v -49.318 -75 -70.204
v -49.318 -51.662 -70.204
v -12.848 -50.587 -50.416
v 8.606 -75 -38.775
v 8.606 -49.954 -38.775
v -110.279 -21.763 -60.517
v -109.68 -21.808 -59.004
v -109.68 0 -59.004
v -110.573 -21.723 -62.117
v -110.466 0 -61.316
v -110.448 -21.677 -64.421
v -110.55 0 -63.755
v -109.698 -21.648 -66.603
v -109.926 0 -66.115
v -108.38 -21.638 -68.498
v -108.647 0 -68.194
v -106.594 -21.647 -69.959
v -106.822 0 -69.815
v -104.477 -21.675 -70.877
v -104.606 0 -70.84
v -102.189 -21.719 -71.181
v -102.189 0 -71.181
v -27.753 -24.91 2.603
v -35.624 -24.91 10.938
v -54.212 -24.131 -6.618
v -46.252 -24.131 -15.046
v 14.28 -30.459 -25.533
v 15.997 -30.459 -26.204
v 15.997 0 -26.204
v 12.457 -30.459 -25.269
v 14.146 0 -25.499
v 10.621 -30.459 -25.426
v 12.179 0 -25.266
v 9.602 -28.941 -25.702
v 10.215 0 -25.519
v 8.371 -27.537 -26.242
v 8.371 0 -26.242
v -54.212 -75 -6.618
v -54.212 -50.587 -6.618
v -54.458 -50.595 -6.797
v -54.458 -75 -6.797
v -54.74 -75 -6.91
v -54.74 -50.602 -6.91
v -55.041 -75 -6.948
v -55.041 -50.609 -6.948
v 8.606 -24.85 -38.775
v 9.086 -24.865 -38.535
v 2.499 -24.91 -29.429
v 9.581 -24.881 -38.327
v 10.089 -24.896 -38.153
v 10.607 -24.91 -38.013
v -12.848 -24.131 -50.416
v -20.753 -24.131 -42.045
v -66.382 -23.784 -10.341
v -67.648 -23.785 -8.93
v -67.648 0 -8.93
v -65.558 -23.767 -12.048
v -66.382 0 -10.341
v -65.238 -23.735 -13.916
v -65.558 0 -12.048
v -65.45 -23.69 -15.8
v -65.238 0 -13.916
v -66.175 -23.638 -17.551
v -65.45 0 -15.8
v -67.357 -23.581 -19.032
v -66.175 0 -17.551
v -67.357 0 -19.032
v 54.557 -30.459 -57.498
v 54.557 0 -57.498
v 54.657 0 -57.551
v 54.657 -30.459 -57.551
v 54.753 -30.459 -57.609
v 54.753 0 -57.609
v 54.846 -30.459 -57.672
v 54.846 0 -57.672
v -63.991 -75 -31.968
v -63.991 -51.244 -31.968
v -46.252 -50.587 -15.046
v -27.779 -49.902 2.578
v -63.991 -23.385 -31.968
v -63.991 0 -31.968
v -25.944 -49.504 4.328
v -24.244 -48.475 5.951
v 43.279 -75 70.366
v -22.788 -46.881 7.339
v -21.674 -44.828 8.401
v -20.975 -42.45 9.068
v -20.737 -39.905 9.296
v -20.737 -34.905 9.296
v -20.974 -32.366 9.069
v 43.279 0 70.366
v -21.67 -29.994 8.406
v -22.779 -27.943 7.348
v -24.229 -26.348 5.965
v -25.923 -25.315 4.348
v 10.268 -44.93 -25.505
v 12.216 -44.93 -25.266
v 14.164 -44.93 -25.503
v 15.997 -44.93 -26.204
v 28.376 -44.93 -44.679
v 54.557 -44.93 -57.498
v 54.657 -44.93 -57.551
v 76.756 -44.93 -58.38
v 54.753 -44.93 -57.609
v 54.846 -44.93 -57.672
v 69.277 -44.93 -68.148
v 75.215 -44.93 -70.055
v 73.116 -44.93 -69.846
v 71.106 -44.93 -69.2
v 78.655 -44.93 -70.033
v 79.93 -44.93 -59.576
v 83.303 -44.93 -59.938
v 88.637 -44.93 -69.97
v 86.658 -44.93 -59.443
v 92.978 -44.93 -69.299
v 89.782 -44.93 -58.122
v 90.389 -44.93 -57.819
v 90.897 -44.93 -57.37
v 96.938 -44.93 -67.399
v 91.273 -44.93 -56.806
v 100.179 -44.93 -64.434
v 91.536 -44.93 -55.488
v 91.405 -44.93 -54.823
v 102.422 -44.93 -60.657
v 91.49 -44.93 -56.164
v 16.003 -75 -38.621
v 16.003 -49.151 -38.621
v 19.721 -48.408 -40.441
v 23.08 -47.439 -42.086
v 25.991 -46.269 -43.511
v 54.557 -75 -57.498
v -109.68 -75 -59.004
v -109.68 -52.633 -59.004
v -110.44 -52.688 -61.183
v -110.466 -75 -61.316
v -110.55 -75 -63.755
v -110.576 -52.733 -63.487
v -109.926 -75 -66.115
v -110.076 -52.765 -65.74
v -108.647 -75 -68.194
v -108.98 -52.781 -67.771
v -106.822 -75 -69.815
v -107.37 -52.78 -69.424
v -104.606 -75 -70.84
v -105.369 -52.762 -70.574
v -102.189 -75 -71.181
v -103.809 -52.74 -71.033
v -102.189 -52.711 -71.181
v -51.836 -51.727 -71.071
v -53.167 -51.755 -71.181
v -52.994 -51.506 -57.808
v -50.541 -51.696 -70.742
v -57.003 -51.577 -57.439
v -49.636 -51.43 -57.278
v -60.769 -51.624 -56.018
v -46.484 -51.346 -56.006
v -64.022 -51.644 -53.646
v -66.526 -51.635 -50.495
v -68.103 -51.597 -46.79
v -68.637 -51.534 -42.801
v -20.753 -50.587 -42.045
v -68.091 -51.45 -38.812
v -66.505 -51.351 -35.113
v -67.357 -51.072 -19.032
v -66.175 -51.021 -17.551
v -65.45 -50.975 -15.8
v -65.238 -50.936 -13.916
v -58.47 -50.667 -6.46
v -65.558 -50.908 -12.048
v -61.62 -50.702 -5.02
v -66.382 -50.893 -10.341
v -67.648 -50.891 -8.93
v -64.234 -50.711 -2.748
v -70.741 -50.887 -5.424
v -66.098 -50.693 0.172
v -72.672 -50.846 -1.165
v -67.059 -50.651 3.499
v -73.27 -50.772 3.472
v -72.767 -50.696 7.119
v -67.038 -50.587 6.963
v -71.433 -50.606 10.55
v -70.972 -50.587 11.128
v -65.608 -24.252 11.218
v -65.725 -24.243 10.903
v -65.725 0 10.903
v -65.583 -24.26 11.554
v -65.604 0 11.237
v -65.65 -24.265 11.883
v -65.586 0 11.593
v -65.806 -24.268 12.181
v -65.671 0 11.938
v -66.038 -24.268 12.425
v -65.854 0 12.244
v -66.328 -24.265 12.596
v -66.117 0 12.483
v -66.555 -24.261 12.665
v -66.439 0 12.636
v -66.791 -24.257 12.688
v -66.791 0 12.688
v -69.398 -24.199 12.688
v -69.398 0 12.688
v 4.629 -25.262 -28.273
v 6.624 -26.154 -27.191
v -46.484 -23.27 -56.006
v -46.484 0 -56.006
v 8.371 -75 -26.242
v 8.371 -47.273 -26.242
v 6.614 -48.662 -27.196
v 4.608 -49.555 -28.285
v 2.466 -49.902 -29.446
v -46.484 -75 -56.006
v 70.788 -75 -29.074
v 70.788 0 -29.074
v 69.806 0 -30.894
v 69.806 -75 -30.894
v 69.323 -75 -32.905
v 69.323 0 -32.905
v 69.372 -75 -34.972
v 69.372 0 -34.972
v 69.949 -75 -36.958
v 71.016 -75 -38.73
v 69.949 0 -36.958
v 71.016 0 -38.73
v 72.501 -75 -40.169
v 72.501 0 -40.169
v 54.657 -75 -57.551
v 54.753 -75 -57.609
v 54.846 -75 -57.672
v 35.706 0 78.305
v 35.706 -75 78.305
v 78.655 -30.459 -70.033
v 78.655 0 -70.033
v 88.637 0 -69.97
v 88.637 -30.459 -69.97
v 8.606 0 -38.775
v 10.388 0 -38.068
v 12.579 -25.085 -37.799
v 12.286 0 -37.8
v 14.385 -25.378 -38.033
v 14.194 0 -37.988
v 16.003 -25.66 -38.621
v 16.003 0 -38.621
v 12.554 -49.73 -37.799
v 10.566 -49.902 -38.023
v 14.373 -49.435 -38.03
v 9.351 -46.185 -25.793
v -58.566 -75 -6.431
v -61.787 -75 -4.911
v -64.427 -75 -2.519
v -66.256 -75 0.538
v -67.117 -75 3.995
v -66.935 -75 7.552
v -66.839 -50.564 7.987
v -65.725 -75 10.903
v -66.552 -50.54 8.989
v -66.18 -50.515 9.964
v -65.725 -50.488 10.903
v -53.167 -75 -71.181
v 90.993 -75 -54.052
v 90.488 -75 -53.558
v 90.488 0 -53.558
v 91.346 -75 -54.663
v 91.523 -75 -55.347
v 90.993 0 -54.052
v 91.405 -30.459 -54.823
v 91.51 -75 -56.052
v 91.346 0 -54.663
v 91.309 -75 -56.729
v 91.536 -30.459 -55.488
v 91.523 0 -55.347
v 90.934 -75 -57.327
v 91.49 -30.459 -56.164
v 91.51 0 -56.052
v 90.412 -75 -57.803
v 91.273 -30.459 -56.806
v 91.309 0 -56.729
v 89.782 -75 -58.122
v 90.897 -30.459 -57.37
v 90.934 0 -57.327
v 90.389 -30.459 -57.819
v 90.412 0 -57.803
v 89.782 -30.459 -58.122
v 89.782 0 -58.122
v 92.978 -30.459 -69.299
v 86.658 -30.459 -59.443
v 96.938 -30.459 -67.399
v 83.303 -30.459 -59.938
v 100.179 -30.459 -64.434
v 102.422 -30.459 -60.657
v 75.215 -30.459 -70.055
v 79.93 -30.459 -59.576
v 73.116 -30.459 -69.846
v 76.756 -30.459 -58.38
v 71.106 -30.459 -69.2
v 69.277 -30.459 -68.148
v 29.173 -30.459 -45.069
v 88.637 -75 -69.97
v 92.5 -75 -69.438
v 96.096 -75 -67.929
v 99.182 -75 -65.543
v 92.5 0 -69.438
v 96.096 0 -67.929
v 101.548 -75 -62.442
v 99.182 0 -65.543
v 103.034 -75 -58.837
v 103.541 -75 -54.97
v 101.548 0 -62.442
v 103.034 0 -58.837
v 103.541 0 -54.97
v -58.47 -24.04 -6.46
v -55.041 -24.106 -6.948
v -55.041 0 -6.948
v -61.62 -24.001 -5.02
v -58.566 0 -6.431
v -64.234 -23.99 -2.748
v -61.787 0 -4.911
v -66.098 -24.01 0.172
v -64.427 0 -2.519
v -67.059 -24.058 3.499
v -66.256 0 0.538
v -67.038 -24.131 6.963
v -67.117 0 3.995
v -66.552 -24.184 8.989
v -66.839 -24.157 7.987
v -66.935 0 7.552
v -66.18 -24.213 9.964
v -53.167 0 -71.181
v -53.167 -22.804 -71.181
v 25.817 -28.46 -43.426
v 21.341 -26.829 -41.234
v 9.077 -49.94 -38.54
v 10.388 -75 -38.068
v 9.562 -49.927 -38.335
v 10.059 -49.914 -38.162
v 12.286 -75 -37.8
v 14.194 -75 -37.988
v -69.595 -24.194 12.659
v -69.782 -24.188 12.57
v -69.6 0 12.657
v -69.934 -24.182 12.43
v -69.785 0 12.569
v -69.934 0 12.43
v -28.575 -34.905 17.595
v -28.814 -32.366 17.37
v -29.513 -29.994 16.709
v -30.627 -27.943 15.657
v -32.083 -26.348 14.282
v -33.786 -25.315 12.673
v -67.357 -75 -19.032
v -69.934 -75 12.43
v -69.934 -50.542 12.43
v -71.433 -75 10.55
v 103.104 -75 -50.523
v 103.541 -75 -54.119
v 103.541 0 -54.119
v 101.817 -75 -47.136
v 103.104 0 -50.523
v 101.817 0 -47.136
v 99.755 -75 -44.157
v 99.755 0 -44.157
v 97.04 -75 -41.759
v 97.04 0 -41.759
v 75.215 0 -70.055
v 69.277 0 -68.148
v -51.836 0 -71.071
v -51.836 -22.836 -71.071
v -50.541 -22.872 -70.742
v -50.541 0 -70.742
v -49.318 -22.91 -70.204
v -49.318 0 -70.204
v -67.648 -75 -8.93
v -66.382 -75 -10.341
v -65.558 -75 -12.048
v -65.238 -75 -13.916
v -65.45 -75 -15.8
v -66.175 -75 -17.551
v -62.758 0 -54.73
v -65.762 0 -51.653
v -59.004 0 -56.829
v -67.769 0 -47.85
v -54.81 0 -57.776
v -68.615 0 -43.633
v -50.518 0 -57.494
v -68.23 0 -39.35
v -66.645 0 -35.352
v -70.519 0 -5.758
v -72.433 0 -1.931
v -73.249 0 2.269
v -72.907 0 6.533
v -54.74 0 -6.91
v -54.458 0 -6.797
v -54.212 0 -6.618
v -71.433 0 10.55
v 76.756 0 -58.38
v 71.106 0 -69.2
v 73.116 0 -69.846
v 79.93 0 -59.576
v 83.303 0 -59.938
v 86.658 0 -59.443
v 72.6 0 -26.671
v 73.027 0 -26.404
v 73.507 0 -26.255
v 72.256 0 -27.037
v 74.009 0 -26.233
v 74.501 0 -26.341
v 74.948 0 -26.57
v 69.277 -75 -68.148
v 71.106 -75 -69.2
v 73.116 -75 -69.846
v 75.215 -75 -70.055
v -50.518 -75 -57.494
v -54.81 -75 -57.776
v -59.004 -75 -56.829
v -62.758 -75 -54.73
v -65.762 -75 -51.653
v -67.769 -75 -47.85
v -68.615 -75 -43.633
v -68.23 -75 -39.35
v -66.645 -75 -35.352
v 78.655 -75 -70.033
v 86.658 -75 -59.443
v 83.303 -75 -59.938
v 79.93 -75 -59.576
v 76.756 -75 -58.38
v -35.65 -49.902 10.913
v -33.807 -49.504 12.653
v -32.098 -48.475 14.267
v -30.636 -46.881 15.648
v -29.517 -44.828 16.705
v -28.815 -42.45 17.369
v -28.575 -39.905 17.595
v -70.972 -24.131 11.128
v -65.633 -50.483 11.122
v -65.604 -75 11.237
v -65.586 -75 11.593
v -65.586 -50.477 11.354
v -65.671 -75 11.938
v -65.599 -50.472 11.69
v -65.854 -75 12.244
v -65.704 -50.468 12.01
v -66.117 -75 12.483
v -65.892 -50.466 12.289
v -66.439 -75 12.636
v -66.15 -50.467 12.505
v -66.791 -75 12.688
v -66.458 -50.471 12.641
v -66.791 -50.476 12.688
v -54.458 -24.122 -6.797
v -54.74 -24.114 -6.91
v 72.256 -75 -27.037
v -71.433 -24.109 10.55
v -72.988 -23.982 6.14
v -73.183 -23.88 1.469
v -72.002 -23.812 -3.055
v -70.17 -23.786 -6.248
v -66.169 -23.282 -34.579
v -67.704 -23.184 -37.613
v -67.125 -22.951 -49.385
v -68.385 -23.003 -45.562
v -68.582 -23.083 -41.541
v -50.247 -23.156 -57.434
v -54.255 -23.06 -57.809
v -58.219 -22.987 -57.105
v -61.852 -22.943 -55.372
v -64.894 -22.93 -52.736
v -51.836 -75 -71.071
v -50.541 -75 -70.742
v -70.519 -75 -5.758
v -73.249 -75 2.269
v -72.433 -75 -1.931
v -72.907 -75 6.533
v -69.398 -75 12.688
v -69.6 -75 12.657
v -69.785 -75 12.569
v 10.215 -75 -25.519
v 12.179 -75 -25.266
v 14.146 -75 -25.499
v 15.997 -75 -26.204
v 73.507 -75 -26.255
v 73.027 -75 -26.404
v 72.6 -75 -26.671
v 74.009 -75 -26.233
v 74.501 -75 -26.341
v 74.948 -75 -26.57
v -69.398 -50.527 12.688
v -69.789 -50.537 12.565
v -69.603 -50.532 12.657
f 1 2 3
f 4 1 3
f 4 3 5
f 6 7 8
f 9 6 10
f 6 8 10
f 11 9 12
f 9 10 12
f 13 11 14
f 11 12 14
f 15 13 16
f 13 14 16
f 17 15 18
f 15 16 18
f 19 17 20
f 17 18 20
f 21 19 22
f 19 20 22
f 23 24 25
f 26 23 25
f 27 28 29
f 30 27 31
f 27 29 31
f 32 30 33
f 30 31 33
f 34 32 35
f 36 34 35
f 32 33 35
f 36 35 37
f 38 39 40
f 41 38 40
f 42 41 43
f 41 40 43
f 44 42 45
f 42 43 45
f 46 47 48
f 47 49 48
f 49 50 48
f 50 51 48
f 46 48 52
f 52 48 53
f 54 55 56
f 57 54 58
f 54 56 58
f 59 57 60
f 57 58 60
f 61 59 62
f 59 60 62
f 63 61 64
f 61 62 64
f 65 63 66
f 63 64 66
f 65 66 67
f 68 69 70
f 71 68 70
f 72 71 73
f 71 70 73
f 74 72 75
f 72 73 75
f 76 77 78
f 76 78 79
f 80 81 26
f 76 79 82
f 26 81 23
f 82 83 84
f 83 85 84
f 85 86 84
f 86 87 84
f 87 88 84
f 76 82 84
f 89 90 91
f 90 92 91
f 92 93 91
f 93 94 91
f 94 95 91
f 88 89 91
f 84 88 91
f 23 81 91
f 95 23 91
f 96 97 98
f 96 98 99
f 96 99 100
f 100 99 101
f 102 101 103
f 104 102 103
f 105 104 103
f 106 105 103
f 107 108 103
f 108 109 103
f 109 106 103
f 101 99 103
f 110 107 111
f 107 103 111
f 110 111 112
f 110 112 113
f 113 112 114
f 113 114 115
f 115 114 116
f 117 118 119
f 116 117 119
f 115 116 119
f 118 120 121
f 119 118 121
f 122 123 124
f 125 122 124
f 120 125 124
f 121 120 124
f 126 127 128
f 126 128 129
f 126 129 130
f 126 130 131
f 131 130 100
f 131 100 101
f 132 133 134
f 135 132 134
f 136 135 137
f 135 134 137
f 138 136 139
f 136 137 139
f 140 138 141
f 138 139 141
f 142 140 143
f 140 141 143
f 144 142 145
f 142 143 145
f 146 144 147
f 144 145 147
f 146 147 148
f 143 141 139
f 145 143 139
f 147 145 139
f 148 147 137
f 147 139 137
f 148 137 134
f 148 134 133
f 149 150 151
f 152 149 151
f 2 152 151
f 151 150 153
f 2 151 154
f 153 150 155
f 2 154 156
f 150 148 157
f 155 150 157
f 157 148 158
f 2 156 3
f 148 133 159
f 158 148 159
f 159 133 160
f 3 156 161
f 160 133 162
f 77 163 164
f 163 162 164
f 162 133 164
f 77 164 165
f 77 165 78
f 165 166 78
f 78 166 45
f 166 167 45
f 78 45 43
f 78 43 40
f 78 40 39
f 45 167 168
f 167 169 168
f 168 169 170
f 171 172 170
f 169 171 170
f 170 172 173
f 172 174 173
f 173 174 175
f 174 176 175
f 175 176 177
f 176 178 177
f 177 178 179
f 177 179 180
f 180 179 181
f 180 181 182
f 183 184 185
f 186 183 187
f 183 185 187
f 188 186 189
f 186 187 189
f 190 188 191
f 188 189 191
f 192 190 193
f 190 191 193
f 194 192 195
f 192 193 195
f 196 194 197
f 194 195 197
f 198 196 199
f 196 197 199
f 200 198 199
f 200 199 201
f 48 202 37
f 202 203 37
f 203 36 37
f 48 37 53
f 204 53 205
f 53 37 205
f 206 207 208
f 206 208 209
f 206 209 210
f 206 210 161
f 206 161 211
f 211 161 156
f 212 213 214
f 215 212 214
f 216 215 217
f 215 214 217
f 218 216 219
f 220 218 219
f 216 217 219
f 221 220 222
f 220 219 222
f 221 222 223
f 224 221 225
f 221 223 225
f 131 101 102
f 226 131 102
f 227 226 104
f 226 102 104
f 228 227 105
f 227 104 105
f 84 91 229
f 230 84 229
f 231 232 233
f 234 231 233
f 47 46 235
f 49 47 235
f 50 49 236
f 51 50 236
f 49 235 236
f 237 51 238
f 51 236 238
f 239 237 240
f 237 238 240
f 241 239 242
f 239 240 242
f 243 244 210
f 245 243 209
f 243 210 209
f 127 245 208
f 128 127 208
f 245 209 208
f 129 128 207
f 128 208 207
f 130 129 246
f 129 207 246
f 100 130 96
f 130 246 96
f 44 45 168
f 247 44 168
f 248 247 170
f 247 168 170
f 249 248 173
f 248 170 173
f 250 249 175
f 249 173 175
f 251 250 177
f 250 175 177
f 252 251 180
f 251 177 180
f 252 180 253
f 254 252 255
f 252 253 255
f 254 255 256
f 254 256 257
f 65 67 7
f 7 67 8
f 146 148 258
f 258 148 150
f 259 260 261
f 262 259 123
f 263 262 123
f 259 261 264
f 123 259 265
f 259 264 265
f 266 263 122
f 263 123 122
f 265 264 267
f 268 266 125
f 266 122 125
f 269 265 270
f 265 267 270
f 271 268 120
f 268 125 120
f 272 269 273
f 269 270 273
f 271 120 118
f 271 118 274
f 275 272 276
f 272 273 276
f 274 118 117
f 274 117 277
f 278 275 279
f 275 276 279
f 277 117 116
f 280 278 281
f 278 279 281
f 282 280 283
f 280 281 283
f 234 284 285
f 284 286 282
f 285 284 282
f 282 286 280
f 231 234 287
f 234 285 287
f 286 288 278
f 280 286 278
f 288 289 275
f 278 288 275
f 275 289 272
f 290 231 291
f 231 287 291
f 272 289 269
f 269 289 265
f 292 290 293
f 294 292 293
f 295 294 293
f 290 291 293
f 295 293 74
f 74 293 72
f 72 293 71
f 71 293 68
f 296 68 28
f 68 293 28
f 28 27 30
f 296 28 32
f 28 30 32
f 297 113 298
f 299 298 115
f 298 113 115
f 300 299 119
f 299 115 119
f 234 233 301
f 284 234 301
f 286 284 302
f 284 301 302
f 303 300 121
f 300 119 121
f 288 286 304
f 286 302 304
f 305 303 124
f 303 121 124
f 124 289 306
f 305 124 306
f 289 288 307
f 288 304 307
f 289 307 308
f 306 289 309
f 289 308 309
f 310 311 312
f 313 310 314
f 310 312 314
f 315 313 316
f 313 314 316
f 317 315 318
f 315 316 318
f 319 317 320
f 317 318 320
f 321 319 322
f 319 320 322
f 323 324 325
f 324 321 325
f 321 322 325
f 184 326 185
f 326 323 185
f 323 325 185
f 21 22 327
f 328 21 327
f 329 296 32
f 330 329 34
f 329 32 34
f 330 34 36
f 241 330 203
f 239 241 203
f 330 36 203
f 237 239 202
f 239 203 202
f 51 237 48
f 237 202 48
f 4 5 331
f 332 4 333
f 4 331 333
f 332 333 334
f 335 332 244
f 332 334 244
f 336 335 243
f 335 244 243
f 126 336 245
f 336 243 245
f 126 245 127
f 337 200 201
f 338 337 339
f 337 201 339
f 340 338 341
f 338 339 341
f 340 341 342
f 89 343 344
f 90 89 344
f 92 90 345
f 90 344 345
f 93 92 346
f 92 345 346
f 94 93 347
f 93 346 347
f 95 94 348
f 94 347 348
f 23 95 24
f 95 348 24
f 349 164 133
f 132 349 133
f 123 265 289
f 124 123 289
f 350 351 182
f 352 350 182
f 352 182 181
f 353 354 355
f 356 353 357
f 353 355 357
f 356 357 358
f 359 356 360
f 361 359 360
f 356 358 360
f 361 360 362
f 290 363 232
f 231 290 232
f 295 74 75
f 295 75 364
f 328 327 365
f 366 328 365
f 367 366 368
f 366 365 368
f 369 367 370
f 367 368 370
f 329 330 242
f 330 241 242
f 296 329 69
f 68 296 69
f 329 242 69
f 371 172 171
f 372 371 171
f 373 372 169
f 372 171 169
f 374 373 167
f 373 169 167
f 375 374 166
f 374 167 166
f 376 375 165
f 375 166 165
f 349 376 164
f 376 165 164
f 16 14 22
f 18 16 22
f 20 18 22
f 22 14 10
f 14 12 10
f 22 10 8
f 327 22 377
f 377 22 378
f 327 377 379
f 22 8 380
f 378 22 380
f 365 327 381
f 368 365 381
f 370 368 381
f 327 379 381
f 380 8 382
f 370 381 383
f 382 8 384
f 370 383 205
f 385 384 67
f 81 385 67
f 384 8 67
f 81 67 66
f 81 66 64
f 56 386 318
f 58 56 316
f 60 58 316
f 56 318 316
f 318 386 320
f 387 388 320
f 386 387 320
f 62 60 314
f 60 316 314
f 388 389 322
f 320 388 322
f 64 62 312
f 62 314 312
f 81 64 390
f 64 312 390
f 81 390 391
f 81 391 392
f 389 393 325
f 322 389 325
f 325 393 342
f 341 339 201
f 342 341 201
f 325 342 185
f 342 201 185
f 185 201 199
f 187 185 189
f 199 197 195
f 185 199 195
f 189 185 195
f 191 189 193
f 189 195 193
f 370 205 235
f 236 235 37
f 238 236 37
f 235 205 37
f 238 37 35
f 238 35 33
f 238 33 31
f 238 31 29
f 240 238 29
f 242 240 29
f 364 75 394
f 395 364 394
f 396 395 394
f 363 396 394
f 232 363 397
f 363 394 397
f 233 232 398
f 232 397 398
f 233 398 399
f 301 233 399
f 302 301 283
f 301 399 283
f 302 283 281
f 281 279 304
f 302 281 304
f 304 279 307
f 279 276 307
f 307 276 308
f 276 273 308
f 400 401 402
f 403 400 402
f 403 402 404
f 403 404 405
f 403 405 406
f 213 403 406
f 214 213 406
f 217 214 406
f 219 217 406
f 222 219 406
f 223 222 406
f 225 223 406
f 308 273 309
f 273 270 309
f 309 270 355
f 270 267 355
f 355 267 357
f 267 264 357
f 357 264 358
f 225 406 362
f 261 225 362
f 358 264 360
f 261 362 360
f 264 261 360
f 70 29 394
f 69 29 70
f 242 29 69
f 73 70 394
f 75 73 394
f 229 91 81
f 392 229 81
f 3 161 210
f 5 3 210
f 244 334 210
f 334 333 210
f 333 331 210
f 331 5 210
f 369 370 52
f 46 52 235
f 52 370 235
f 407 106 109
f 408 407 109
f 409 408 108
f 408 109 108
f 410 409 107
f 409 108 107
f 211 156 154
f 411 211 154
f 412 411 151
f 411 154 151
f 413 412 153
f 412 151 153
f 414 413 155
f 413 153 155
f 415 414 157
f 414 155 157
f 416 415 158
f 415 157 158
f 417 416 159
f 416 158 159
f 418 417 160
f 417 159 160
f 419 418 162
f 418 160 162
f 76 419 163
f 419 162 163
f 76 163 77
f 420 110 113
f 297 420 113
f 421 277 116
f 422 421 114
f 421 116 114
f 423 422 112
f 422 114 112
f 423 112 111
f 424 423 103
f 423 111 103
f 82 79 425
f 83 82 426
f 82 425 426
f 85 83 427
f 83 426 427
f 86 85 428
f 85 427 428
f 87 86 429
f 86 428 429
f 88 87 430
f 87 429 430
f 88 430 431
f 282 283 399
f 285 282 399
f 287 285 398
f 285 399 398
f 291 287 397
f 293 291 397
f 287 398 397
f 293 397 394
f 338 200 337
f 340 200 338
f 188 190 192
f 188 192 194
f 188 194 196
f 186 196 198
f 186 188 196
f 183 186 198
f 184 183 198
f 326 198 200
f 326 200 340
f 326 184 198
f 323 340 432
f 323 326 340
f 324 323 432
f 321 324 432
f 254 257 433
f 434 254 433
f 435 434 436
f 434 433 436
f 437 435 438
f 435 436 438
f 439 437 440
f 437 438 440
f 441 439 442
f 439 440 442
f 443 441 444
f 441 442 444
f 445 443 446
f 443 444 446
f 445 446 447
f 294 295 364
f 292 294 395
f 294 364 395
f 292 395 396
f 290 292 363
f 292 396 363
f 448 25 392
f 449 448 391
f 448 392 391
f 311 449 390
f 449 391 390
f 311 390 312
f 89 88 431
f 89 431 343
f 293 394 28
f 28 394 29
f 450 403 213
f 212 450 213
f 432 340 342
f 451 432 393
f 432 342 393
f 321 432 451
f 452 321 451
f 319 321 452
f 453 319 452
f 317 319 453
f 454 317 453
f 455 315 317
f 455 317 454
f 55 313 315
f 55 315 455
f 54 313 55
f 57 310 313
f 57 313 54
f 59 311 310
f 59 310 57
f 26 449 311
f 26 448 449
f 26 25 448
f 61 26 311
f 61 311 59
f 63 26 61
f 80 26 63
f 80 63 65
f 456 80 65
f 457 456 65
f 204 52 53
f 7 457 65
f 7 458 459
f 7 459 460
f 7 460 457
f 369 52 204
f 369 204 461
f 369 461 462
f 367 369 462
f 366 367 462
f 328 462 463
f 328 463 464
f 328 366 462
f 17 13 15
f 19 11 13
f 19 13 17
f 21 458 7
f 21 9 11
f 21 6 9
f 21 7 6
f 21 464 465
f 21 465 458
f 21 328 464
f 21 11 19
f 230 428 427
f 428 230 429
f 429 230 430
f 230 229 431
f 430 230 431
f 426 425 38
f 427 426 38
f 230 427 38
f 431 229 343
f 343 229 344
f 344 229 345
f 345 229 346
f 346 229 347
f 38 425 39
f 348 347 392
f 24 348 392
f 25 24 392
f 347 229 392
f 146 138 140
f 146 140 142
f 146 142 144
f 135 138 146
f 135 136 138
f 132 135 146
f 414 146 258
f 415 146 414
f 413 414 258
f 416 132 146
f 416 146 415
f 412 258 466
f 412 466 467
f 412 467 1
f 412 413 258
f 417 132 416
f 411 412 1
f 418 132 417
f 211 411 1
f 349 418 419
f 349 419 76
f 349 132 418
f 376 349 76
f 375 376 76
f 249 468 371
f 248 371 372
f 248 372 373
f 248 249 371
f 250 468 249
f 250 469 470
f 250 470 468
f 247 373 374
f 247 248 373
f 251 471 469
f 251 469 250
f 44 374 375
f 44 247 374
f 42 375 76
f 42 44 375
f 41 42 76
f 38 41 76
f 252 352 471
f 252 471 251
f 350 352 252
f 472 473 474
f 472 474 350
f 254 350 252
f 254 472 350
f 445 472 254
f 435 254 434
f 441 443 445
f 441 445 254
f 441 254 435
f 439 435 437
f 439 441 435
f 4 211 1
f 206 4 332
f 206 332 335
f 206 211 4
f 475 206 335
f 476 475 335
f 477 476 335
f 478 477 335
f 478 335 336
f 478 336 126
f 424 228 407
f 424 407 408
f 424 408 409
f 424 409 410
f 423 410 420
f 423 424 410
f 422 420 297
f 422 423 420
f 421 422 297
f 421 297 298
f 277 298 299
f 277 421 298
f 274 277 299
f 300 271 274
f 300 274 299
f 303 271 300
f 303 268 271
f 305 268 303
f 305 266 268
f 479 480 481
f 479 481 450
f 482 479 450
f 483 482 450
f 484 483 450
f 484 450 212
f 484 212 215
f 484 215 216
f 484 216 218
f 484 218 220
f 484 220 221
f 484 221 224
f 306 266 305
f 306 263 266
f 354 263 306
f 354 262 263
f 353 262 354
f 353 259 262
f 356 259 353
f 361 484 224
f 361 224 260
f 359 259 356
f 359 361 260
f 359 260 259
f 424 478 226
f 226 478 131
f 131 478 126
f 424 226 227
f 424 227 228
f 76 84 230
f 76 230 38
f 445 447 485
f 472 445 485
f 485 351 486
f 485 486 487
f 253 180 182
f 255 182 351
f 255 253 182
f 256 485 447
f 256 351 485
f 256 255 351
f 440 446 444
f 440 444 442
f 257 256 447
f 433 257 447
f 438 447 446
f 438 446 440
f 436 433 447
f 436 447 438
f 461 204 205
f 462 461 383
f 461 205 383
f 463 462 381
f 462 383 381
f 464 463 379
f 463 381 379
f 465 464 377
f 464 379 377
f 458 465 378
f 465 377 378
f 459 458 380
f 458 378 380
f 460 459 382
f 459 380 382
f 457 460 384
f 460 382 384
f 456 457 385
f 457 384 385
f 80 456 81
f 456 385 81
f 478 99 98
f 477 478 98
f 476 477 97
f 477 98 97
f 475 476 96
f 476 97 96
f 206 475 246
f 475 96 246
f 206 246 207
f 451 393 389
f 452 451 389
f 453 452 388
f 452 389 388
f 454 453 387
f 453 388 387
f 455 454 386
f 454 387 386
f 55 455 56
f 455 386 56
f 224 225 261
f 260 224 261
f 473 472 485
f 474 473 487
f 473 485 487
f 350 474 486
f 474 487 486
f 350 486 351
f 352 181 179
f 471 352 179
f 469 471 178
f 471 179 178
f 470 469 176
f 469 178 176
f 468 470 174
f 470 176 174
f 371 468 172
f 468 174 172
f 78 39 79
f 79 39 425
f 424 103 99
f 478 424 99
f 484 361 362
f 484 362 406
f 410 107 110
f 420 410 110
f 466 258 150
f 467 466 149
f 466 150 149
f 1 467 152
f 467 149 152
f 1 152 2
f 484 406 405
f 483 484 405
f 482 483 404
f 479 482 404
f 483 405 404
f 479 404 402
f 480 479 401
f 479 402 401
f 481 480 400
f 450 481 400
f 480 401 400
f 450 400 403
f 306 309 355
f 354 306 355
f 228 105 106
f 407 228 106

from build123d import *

# Parameters (mm, degrees)
F1_DEPTH      = 75
F3_DEPTH      = 30
F3_DEPTH_BACK = 90
F4_W          = 68.7531680209
F4_H          = 14.4708263688
F5_DEPTH      = 25
F5_DEPTH_BACK = 10


with BuildPart() as f1:
    # F0 (on Front) → F1 (new body)
    with BuildSketch(Plane.XZ):
        with BuildLine():
            Line((35.7055822906, 78.3045381219), (-54.2122411279, -6.6178094916))
            ThreePointArc((-54.2122411279, -6.6178094916), (-54.5952252844, -6.8622663067), (-55.0413462098, -6.9483599686))
            ThreePointArc((-55.0413462098, -6.9483599686), (-65.454548531, -1.0579541733), (-65.7249668893, 10.9027538713))
            ThreePointArc((-65.7249668893, 10.9027538713), (-65.7514161094, 12.0978334092), (-66.7910191515, 12.6878674574))
            Line((-66.7910191515, 12.6878674574), (-69.3984164298, 12.6878674574))
            ThreePointArc((-69.3984164298, 12.6878674574), (-69.6958292502, 12.6199768131), (-69.9343224371, 12.4297545087))
            Line((-69.9343224371, 12.4297545087), (-71.4332162747, 10.549801355))
            ThreePointArc((-71.4332162747, 10.549801355), (-72.983516127, 0.1409632474), (-67.6478594542, -8.9297648519))
            ThreePointArc((-67.6478594542, -8.9297648519), (-65.2384193211, -13.915925777), (-67.3571118078, -19.0324035373))
            Line((-67.3571118078, -19.0324035373), (-109.6802590447, -59.0042454993))
            ThreePointArc((-109.6802590447, -59.0042454993), (-109.3628044531, -67.2017482376), (-102.1890001615, -71.1812407363))
            Line((-102.1890001615, -71.1812407363), (-53.1669473059, -71.1812407356))
            ThreePointArc((-53.1669473059, -71.1812407356), (-51.1816807122, -70.9332267187), (-49.3184445074, -70.2044295966))
            Line((-49.3184445074, -70.2044295966), (8.606172505, -38.7753114248))
            ThreePointArc((8.606172505, -38.7753114248), (12.2860183049, -37.8002629481), (16.0033975224, -38.6206752819))
            Line((16.0033975224, -38.6206752819), (54.5573614144, -57.4984885011))
            ThreePointArc((54.5573614144, -57.4984885011), (54.7053822121, -57.5790589788), (54.8459093451, -57.6720852296))
            Line((54.8459093451, -57.6720852296), (69.2774157369, -68.1477812421))
            ThreePointArc((69.2774157369, -68.1477812421), (72.0938830707, -69.5760831015), (75.2153037267, -70.0549019945))
            Line((75.2153037267, -70.0549019945), (78.6547126816, -70.03306521))
            Line((78.6547126816, -70.03306521), (88.6365619759, -69.9696905154))
            ThreePointArc((88.6365619759, -69.9696905154), (99.1815473838, -65.542870992), (103.5413289953, -54.9699928292))
            Line((103.5413289953, -54.9699928292), (103.5413289953, -54.1190856195))
            ThreePointArc((103.5413289953, -54.1190856195), (101.8167785406, -47.1360748524), (97.0396704124, -41.7587380046))
            Line((97.0396704124, -41.7587380046), (74.9481714859, -26.5697557736))
            ThreePointArc((74.9481714859, -26.5697557736), (73.5068370972, -26.2547430485), (72.2561461348, -27.0373348667))
            Line((72.2561461348, -27.0373348667), (70.7882150116, -29.0739654592))
            ThreePointArc((70.7882150116, -29.0739654592), (69.371825982, -34.9724326755), (72.5013272631, -40.1689983795))
            Line((72.5013272631, -40.1689983795), (90.4884265587, -53.557894228))
            ThreePointArc((90.4884265587, -53.557894228), (91.510056882, -56.0523850299), (89.7824317217, -58.1215694547))
            ThreePointArc((89.7824317217, -58.1215694547), (83.3025731901, -59.9380088951), (76.7556883533, -58.3803446938))
            Line((76.7556883533, -58.3803446938), (15.9965307599, -26.203911059))
            ThreePointArc((15.9965307599, -26.203911059), (12.1791348203, -25.2657414738), (8.3714169644, -26.2424495468))
            Line((8.3714169644, -26.2424495468), (-46.4835128256, -56.0059967154))
            ThreePointArc((-46.4835128256, -56.0059967154), (-65.7620061585, -51.6527529228), (-63.9911285633, -31.9683675057))
            Line((-63.9911285633, -31.9683675057), (43.2786946767, 70.3661996968))
            Line((43.2786946767, 70.3661996968), (35.7055822906, 78.3045381219))
        make_face()
    extrude(amount=F1_DEPTH)

    # F2 (on face) → F3 (cut, two sides)
    with BuildSketch(Plane(origin=(-22.2549429173, 0, 23.5640686305), x_dir=(0.7270133187, 0, 0.686623357), z_dir=(-0.686623357, 0, 0.7270133187))) as f3_sk:
        Polygon((-43.9569639067, -24.1313080694), (-143.9990401268, -21.0843849927), (-143.4555607145, -53.2556629783), (-43.9569639067, -50.5866528074), align=None)
        with BuildLine():
            Line((-18.389185364, -24.9100109652), (-43.9569639067, -24.1313080694))
            Line((-43.9569639067, -24.1313080694), (-43.9569639067, -50.5866528074))
            Line((-43.9569639067, -50.5866528074), (-18.4254588112, -49.9017803673))
            ThreePointArc((-18.4254588112, -49.9017803673), (-11.5283625374, -46.8809946351), (-8.6936083649, -39.905376223))
            Line((-8.6936083649, -39.905376223), (-8.6936083649, -34.905376223))
            ThreePointArc((-8.6936083649, -34.905376223), (-11.5157176577, -27.9427700303), (-18.389185364, -24.9100109652))
        make_face()
    extrude(amount=F3_DEPTH, mode=Mode.SUBTRACT)
    extrude(f3_sk.sketch, amount=-F3_DEPTH_BACK, mode=Mode.SUBTRACT)

    # F4 (on face) → F5 (cut, two sides)
    with BuildSketch(Plane(origin=(-7.3339171449, 0, -13.8487264512), x_dir=(0.8837288425, 0, -0.4679992873), z_dir=(0.4679992873, 0, 0.8837288425))) as f5_sk:
        with Locations((60.7765913236, -37.6946638618)):
            Rectangle(F4_W, F4_H)
        with BuildLine():
            ThreePointArc((11.2418346107, -39.9300770462), (12.7063007048, -43.4656109521), (16.2418346107, -44.9300770462))
            Line((16.2418346107, -44.9300770462), (26.4000073131, -44.9300770462))
            Line((26.4000073131, -44.9300770462), (26.4000073131, -30.4592506774))
            Line((26.4000073131, -30.4592506774), (16.2418346107, -30.4592506774))
            ThreePointArc((16.2418346107, -30.4592506774), (12.7063007048, -31.9237167714), (11.2418346107, -35.4592506774))
            Line((11.2418346107, -35.4592506774), (11.2418346107, -39.9300770462))
        make_face()
        with BuildLine():
            Line((95.153175334, -30.4592506774), (95.153175334, -44.9300770462))
            Line((95.153175334, -44.9300770462), (131.284661945, -44.9300770462))
            ThreePointArc((131.284661945, -44.9300770462), (134.8201958509, -43.4656109521), (136.284661945, -39.9300770462))
            Line((136.284661945, -39.9300770462), (136.284661945, -35.4592506774))
            ThreePointArc((136.284661945, -35.4592506774), (134.8201958509, -31.9237167714), (131.284661945, -30.4592506774))
            Line((131.284661945, -30.4592506774), (95.153175334, -30.4592506774))
        make_face()
    extrude(amount=-F5_DEPTH, mode=Mode.SUBTRACT)
    extrude(f5_sk.sketch, amount=F5_DEPTH_BACK, mode=Mode.SUBTRACT)


solid = f1.part
